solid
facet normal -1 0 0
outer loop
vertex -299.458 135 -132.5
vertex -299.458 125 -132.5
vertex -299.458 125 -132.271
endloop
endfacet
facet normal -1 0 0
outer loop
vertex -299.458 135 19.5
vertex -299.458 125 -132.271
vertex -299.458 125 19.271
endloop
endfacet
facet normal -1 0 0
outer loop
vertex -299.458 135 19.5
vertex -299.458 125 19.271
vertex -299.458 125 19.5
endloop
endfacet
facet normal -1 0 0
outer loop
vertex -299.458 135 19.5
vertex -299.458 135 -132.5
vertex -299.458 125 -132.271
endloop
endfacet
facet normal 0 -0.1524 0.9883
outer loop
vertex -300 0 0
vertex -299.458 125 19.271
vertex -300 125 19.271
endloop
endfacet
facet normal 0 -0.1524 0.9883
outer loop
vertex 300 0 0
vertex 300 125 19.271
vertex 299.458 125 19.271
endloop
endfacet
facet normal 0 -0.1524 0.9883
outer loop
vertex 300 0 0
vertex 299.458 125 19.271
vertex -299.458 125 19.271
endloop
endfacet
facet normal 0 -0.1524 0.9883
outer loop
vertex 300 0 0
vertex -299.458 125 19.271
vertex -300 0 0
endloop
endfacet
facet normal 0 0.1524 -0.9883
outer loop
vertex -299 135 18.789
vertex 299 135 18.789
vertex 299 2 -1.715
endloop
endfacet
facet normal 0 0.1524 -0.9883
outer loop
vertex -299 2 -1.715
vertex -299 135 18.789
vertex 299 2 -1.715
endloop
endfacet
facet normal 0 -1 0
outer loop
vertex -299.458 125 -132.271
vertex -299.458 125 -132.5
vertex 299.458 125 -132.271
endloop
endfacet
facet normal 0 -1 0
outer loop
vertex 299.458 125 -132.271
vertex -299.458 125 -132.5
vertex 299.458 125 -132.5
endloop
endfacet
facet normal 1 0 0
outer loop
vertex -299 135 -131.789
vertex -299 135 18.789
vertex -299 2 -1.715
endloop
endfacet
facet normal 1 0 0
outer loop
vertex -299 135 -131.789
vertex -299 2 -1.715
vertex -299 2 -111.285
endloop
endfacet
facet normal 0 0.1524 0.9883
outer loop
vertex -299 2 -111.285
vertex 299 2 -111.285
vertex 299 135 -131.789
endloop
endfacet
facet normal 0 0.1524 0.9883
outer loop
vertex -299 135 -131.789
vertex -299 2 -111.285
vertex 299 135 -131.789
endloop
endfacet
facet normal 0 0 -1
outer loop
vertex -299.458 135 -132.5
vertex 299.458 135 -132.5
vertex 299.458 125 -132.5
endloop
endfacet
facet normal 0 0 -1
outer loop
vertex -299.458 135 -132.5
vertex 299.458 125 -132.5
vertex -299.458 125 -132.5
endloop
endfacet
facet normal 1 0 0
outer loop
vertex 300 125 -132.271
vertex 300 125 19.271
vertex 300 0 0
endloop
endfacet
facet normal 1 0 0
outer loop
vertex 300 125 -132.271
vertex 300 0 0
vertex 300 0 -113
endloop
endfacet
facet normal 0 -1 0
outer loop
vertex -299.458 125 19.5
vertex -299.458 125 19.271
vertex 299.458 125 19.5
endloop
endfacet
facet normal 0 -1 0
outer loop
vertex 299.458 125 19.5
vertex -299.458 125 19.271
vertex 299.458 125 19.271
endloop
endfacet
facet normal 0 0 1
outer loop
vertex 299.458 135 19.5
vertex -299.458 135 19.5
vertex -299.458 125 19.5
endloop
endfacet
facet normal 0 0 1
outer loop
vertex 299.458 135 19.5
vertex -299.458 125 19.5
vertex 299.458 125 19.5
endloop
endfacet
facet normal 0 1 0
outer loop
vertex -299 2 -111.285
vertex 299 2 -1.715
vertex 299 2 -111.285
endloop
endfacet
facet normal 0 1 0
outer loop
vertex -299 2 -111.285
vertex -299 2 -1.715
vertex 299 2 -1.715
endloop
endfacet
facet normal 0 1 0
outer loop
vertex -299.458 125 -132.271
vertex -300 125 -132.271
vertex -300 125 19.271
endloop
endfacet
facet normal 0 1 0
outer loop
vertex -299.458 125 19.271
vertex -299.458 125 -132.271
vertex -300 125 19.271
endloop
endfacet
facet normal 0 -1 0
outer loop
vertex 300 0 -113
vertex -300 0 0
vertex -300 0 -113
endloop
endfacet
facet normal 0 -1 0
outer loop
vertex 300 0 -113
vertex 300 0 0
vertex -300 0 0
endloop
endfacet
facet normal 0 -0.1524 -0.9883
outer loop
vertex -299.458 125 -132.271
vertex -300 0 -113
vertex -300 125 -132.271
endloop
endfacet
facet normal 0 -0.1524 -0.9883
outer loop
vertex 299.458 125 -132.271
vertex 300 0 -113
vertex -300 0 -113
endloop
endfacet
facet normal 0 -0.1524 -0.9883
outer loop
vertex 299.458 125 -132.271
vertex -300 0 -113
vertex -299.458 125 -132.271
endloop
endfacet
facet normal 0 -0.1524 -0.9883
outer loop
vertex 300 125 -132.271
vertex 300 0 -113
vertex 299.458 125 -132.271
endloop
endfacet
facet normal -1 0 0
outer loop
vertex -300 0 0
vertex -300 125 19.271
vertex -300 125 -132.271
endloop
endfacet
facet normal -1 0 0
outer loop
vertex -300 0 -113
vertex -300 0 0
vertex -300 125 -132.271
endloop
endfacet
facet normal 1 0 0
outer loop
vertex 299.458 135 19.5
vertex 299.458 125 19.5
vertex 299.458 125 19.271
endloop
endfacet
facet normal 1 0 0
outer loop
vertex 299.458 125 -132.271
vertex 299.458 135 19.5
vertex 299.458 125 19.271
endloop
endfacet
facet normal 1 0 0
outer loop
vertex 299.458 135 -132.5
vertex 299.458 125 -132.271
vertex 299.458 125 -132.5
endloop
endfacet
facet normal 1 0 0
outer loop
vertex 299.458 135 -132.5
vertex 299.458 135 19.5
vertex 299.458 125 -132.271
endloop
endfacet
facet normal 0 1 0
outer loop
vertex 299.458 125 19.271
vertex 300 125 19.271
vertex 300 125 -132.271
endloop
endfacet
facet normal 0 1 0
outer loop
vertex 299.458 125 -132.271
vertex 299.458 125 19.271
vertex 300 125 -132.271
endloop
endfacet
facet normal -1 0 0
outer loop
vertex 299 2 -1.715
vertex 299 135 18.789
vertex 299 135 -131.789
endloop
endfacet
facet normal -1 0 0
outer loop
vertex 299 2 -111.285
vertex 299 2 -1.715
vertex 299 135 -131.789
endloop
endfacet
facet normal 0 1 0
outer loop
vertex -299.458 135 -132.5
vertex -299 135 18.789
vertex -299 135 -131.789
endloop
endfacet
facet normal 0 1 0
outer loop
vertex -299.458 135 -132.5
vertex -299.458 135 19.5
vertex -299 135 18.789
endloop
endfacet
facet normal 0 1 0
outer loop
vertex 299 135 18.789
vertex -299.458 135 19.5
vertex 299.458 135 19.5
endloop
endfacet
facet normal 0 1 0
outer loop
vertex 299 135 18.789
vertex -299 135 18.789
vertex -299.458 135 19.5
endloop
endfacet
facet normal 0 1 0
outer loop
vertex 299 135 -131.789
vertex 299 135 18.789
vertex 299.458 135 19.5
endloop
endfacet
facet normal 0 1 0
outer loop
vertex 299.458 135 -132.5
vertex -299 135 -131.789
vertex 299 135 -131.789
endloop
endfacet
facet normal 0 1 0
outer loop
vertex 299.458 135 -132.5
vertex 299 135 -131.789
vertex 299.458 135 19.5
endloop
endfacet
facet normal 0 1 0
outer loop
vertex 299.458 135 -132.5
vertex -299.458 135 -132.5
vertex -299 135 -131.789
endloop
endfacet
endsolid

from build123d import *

# Parameters (mm, degrees)
BOSS_EXTRUDE1_DEPTH = 300
SKETCH2_W           = 616.91666666
SKETCH2_H           = 169.999999994
BOSS_EXTRUDE2_DEPTH = 5
CUT_EXTRUDE1_START  = -300
CUT_EXTRUDE1_DEPTH  = 299
SKETCH4_W           = 616.91666666
SKETCH4_H           = 10
CUT_EXTRUDE2_DEPTH  = 9
SKETCH5_W           = 616.91666666
SKETCH5_H           = 10
CUT_EXTRUDE3_DEPTH  = 9
SKETCH6_W           = 151.999999994
SKETCH6_H           = 10
CUT_EXTRUDE4_DEPTH  = 9
SKETCH7_W           = 151.999999994
SKETCH7_H           = 10
CUT_EXTRUDE5_DEPTH  = 9


with BuildPart() as part:
    # Sketch1 → Boss-Extrude1 (new, symmetric)
    with BuildSketch(Plane(origin=(0, 0, 0), x_dir=(0, 0, -1), z_dir=(1, 0, 0))):
        Polygon((0, 0), (113, 0), (133.041666667, 130), (-20.041666667, 130), align=None)
    extrude(amount=BOSS_EXTRUDE1_DEPTH, both=True)

    # Sketch2 → Boss-Extrude2 (add, symmetric)
    with BuildSketch(Plane(origin=(0, 130, 0), x_dir=(1, 0, 0), z_dir=(0, 1, 0))):
        with Locations((0, 56.5)):
            Rectangle(SKETCH2_W, SKETCH2_H)
    extrude(amount=BOSS_EXTRUDE2_DEPTH, both=True)

    # Sketch3 → Cut-Extrude1 (cut, symmetric)
    with BuildSketch(Plane.ZY.offset(300).offset(CUT_EXTRUDE1_START)):
        Polygon((-131.788872207, 135), (18.788872207, 135), (-1.71529446, 2), (-111.28470554, 2), align=None)
    extrude(amount=CUT_EXTRUDE1_DEPTH, both=True, mode=Mode.SUBTRACT)

    # Sketch4 → Cut-Extrude2 (cut)
    with BuildSketch(Plane(origin=(0, 0, -141.499999997), x_dir=(-1, 0, 0), z_dir=(0, 0, -1))):
        with Locations((0, 130)):
            Rectangle(SKETCH4_W, SKETCH4_H)
    extrude(amount=-CUT_EXTRUDE2_DEPTH, mode=Mode.SUBTRACT)

    # Sketch5 → Cut-Extrude3 (cut)
    with BuildSketch(Plane.XY.offset(28.499999997)):
        with Locations((0, 130)):
            Rectangle(SKETCH5_W, SKETCH5_H)
    extrude(amount=-CUT_EXTRUDE3_DEPTH, mode=Mode.SUBTRACT)

    # Sketch6 → Cut-Extrude4 (cut)
    with BuildSketch(Plane.ZY.offset(308.45833333)):
        with Locations((-56.5, 130)):
            Rectangle(SKETCH6_W, SKETCH6_H)
    extrude(amount=-CUT_EXTRUDE4_DEPTH, mode=Mode.SUBTRACT)

    # Sketch7 → Cut-Extrude5 (cut)
    with BuildSketch(Plane(origin=(308.45833333, 0, 0), x_dir=(0, 0, -1), z_dir=(1, 0, 0))):
        with Locations((56.5, 130)):
            Rectangle(SKETCH7_W, SKETCH7_H)
    extrude(amount=-CUT_EXTRUDE5_DEPTH, mode=Mode.SUBTRACT)


solid = part.part
